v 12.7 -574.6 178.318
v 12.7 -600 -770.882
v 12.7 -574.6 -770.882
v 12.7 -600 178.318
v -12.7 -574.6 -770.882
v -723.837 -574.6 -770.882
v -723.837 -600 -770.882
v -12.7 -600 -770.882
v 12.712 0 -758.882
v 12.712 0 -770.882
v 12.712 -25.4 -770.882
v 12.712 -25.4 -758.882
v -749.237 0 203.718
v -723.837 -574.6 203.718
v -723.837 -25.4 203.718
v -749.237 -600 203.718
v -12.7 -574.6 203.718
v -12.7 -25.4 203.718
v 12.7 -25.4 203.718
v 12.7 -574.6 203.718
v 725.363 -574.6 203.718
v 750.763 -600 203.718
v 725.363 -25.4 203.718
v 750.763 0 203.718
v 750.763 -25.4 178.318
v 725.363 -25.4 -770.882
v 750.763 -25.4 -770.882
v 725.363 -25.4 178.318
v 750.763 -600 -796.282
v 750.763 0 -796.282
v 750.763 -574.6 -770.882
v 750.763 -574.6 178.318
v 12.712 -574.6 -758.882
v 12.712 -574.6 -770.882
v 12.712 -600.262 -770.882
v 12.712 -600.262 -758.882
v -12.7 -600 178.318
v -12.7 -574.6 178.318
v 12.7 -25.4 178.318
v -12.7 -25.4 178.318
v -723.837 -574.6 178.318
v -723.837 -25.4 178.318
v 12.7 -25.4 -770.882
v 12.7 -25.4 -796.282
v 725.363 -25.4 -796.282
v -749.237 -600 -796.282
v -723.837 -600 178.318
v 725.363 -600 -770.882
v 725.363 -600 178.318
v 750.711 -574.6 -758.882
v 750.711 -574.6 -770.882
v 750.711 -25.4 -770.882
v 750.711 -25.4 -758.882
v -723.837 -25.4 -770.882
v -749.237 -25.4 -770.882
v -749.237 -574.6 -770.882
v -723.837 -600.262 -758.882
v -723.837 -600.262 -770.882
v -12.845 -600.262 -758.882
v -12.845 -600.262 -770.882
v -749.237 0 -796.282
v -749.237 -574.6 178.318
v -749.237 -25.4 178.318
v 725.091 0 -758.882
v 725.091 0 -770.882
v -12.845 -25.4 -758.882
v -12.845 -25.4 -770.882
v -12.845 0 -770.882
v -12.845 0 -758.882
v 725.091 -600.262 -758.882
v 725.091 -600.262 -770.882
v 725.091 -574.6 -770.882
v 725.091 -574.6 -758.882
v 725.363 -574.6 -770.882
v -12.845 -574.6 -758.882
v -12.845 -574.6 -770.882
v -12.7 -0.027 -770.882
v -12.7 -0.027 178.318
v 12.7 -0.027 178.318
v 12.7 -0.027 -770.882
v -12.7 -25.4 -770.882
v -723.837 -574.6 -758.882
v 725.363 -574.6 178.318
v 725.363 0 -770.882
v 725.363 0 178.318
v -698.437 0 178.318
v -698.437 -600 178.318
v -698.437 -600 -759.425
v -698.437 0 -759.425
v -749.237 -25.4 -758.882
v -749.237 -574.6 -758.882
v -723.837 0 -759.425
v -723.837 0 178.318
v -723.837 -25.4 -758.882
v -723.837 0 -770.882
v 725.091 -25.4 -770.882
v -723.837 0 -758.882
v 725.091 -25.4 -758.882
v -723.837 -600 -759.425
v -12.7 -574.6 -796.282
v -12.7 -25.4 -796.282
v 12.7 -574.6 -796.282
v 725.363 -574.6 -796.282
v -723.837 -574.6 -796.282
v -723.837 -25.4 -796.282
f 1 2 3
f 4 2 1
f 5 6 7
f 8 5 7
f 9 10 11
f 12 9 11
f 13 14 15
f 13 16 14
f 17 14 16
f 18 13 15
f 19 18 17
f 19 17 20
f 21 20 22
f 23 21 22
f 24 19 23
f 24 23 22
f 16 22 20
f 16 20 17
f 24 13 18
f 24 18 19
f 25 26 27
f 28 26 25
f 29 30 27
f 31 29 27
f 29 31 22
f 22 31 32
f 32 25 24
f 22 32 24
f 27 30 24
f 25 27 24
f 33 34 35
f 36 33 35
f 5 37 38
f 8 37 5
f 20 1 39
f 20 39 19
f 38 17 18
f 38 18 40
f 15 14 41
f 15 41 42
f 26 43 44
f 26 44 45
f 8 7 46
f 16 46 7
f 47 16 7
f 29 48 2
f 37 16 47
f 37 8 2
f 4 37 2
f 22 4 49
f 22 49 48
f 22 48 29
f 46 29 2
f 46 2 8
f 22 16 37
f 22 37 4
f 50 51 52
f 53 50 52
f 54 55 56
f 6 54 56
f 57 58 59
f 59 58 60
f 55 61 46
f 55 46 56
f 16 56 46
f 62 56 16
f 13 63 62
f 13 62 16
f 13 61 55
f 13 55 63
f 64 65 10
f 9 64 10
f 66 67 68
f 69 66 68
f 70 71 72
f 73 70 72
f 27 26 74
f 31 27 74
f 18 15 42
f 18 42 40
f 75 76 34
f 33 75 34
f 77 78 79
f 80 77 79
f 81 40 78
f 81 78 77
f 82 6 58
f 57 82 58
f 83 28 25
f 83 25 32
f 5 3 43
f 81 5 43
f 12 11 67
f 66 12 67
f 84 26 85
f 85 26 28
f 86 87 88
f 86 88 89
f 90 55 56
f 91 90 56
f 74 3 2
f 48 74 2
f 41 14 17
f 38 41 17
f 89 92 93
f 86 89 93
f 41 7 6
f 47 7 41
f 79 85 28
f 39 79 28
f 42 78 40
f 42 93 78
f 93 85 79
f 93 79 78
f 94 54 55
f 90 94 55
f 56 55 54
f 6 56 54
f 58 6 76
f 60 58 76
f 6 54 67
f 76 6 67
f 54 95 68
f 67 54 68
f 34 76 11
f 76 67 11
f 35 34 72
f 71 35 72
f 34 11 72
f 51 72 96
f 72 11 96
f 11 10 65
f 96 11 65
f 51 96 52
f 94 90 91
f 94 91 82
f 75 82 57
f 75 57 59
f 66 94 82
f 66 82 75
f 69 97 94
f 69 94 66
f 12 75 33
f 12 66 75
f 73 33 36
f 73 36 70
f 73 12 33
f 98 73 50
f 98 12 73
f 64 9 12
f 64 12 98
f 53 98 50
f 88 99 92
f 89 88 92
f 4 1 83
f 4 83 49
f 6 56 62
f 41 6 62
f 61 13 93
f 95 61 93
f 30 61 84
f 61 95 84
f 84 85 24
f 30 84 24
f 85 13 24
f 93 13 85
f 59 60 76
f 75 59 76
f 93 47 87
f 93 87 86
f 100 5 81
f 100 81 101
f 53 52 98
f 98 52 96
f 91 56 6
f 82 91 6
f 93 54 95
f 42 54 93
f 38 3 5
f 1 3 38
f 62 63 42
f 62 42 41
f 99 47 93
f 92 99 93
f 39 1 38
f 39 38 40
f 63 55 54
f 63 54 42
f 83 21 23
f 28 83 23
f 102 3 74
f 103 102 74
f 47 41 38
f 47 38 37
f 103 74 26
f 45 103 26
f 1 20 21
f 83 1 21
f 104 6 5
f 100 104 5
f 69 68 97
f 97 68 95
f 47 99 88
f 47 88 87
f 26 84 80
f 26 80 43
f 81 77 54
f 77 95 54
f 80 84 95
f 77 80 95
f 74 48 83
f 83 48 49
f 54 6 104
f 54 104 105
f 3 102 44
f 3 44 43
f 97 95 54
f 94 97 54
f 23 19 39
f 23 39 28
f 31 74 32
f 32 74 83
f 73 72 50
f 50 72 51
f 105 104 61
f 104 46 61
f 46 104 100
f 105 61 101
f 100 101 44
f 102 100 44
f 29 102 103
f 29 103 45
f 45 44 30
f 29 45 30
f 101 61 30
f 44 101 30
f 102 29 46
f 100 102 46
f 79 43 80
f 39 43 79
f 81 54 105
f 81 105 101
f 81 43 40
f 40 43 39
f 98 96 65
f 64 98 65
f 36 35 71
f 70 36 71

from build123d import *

# Parameters (mm, degrees)
F0_W      = 1500
F0_H      = 1000
F1_DEPTH  = 600
F2_W      = 711.9
F2_H      = 949.2
F2_W_2    = 25.4
F3_DEPTH  = 600.001
F4_W      = 549.2
F4_H      = 949.2
F5_DEPTH  = 1500.001
F6_W      = 1449.2
F6_H      = 549.2
F7_DEPTH  = 1000.001
F9_DEPTH  = 599.9734
F10_W     = 549.2
F10_H     = 949.2
F11_DEPTH = 1500.001
F13_DEPTH = 12
F14_W     = 600
F14_H     = 937.7431182263
F15_DEPTH = 25.4


with BuildPart() as f1:
    # F0 (on Front) → F1 (new body)
    with BuildSketch(Plane.XZ):
        with Locations((0.7634554058, -296.2822238567)):
            Rectangle(F0_W, F0_H)
    extrude(amount=F1_DEPTH)

    # F2 (on face) → F3 (cut, through all)
    with BuildSketch(Plane.XZ.offset(600)):
        with Locations((-367.8865445942, -296.2822238567)):
            Rectangle(F2_W, F2_H)
        with Locations((0.7634554058, -296.2822238567)):
            Rectangle(F2_W_2, F2_H)
        with Locations((369.4134554058, -296.2822238567)):
            Rectangle(F2_W, F2_H)
    extrude(amount=-F3_DEPTH, mode=Mode.SUBTRACT)

    # F4 (on face) → F5 (cut, through all)
    with BuildSketch(Plane(origin=(-749.2365445942, 0, 0), x_dir=(0, -1, 0), z_dir=(-1, 0, 0))):
        with Locations((300, -296.2822238567)):
            Rectangle(F4_W, F4_H)
    extrude(amount=-F5_DEPTH, mode=Mode.SUBTRACT)

    # F6 (on face) → F7 (cut, through all)
    with BuildSketch(Plane.XY.offset(203.7177761433)):
        with Locations((0.7634554058, -300)):
            Rectangle(F6_W, F6_H)
    extrude(amount=-F7_DEPTH, mode=Mode.SUBTRACT)

    # F8 (on face) → F9 (join)
    with BuildSketch(Plane.XZ.offset(600)):
        Polygon((12.7, 203.7177761433), (0, 203.7177761433), (-12.7, 203.7177761433), (-12.7, -796.2822238567), (12.7, -796.2822238567), align=None)
    extrude(amount=-F9_DEPTH)

    # F10 (on face) → F11 (cut, through all)
    with BuildSketch(Plane.YZ.offset(750.7634554058)):
        with Locations((-300, -296.2822238567)):
            Rectangle(F10_W, F10_H)
    extrude(amount=-F11_DEPTH, mode=Mode.SUBTRACT)


with BuildPart() as f13:
    # F12 (on face) → F13 (new body)
    with BuildSketch(Plane.XY.offset(-770.8822238567)):
        Polygon((-749.2365445942, -25.4), (-749.2365445942, -574.6), (-723.8365445942, -574.6), (-723.8365445942, -600.2621650696), (-12.8450281918, -600.2621650696), (-12.8450281918, -574.6), (12.7119384706, -574.6), (12.7119384706, -600.2621650696), (725.0914573669, -600.2621650696), (725.0914573669, -574.6), (750.7110238075, -574.6), (750.7110238075, -25.4), (725.0914573669, -25.4), (725.0914573669, 0), (12.7119384706, 0), (12.7119384706, -25.4), (-12.8450281918, -25.4), (-12.8450281918, 0), (-723.8365445942, 0), (-723.8365445942, -25.4), align=None)
    extrude(amount=F13_DEPTH)


with BuildPart() as f15:
    # F14 (on face) → F15 (new body)
    with BuildSketch(Plane.YZ.offset(-723.8365445942)):
        with Locations((-300, -290.5537829698)):
            Rectangle(F14_W, F14_H)
    extrude(amount=F15_DEPTH)


solid = Compound([f1.part, f13.part, f15.part])
